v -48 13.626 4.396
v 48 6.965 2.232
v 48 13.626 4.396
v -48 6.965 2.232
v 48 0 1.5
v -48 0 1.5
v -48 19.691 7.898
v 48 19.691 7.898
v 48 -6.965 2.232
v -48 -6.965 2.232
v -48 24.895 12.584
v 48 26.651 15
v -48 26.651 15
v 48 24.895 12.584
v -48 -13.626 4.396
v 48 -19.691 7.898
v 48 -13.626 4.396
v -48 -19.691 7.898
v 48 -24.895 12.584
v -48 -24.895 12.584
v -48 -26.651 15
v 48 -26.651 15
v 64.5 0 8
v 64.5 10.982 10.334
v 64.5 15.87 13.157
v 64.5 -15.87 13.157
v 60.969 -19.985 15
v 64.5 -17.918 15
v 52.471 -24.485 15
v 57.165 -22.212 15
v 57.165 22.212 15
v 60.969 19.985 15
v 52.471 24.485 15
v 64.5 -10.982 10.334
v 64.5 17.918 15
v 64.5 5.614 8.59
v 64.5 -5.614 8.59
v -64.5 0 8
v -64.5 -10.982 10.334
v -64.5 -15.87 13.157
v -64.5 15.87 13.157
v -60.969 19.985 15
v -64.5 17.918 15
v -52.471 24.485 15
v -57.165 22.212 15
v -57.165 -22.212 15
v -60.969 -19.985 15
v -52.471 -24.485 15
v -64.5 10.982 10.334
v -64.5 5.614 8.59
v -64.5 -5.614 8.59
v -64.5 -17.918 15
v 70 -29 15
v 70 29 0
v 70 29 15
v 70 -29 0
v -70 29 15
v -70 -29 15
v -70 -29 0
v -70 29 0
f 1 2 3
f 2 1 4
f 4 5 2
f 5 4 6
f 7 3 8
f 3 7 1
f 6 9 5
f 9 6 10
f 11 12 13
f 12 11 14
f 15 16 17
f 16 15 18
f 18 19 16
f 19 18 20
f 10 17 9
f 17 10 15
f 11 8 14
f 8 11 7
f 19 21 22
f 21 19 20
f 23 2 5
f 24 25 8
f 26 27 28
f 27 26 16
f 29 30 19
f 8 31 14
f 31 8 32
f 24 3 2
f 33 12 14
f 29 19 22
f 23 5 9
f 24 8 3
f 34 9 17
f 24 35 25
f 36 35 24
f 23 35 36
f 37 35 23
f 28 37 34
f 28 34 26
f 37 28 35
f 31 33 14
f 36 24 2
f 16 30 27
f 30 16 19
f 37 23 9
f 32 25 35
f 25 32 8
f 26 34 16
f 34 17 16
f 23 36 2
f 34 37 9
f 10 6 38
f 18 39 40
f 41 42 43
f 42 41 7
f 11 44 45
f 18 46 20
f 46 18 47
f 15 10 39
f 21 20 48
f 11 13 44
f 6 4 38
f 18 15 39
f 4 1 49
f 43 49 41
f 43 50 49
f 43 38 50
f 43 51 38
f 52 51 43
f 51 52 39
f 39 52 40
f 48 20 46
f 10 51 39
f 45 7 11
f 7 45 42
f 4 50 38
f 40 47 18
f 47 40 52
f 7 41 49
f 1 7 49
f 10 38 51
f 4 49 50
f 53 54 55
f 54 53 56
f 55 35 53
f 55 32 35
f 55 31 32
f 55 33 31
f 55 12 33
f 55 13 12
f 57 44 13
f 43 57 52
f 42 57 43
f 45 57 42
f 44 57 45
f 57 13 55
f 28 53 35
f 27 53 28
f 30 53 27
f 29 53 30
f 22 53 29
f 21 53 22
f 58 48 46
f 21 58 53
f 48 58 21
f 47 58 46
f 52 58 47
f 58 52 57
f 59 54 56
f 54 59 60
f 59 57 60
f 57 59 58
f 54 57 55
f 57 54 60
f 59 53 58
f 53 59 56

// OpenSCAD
module can(){
    tolerance = 1;
    h = 95;
    diameter = 66;
    end_diameter = 53;
    chamfer = 16.5;
    translate([0,0,(-h-tolerance)/2]){
        union(){

        //frame
        cylinder(d=66+tolerance,h=h+tolerance);

        //top
        translate([0,0,h+tolerance])
            cylinder(d1=diameter+tolerance, d2=end_diameter+tolerance, h=chamfer);

        //bottom 
        rotate([180,0,0])
            cylinder(d1=diameter+tolerance, d2=end_diameter+tolerance, h=chamfer);
        }
    }
}

l = 140;
w = 58;

//main holder
translate([-l/2,-w/2,0])
    difference(){
        //carriage
        cube([l,58,15]);

        //can
        translate([l/2,58/2,35])
            rotate([0,90,0])
                can();
    }
